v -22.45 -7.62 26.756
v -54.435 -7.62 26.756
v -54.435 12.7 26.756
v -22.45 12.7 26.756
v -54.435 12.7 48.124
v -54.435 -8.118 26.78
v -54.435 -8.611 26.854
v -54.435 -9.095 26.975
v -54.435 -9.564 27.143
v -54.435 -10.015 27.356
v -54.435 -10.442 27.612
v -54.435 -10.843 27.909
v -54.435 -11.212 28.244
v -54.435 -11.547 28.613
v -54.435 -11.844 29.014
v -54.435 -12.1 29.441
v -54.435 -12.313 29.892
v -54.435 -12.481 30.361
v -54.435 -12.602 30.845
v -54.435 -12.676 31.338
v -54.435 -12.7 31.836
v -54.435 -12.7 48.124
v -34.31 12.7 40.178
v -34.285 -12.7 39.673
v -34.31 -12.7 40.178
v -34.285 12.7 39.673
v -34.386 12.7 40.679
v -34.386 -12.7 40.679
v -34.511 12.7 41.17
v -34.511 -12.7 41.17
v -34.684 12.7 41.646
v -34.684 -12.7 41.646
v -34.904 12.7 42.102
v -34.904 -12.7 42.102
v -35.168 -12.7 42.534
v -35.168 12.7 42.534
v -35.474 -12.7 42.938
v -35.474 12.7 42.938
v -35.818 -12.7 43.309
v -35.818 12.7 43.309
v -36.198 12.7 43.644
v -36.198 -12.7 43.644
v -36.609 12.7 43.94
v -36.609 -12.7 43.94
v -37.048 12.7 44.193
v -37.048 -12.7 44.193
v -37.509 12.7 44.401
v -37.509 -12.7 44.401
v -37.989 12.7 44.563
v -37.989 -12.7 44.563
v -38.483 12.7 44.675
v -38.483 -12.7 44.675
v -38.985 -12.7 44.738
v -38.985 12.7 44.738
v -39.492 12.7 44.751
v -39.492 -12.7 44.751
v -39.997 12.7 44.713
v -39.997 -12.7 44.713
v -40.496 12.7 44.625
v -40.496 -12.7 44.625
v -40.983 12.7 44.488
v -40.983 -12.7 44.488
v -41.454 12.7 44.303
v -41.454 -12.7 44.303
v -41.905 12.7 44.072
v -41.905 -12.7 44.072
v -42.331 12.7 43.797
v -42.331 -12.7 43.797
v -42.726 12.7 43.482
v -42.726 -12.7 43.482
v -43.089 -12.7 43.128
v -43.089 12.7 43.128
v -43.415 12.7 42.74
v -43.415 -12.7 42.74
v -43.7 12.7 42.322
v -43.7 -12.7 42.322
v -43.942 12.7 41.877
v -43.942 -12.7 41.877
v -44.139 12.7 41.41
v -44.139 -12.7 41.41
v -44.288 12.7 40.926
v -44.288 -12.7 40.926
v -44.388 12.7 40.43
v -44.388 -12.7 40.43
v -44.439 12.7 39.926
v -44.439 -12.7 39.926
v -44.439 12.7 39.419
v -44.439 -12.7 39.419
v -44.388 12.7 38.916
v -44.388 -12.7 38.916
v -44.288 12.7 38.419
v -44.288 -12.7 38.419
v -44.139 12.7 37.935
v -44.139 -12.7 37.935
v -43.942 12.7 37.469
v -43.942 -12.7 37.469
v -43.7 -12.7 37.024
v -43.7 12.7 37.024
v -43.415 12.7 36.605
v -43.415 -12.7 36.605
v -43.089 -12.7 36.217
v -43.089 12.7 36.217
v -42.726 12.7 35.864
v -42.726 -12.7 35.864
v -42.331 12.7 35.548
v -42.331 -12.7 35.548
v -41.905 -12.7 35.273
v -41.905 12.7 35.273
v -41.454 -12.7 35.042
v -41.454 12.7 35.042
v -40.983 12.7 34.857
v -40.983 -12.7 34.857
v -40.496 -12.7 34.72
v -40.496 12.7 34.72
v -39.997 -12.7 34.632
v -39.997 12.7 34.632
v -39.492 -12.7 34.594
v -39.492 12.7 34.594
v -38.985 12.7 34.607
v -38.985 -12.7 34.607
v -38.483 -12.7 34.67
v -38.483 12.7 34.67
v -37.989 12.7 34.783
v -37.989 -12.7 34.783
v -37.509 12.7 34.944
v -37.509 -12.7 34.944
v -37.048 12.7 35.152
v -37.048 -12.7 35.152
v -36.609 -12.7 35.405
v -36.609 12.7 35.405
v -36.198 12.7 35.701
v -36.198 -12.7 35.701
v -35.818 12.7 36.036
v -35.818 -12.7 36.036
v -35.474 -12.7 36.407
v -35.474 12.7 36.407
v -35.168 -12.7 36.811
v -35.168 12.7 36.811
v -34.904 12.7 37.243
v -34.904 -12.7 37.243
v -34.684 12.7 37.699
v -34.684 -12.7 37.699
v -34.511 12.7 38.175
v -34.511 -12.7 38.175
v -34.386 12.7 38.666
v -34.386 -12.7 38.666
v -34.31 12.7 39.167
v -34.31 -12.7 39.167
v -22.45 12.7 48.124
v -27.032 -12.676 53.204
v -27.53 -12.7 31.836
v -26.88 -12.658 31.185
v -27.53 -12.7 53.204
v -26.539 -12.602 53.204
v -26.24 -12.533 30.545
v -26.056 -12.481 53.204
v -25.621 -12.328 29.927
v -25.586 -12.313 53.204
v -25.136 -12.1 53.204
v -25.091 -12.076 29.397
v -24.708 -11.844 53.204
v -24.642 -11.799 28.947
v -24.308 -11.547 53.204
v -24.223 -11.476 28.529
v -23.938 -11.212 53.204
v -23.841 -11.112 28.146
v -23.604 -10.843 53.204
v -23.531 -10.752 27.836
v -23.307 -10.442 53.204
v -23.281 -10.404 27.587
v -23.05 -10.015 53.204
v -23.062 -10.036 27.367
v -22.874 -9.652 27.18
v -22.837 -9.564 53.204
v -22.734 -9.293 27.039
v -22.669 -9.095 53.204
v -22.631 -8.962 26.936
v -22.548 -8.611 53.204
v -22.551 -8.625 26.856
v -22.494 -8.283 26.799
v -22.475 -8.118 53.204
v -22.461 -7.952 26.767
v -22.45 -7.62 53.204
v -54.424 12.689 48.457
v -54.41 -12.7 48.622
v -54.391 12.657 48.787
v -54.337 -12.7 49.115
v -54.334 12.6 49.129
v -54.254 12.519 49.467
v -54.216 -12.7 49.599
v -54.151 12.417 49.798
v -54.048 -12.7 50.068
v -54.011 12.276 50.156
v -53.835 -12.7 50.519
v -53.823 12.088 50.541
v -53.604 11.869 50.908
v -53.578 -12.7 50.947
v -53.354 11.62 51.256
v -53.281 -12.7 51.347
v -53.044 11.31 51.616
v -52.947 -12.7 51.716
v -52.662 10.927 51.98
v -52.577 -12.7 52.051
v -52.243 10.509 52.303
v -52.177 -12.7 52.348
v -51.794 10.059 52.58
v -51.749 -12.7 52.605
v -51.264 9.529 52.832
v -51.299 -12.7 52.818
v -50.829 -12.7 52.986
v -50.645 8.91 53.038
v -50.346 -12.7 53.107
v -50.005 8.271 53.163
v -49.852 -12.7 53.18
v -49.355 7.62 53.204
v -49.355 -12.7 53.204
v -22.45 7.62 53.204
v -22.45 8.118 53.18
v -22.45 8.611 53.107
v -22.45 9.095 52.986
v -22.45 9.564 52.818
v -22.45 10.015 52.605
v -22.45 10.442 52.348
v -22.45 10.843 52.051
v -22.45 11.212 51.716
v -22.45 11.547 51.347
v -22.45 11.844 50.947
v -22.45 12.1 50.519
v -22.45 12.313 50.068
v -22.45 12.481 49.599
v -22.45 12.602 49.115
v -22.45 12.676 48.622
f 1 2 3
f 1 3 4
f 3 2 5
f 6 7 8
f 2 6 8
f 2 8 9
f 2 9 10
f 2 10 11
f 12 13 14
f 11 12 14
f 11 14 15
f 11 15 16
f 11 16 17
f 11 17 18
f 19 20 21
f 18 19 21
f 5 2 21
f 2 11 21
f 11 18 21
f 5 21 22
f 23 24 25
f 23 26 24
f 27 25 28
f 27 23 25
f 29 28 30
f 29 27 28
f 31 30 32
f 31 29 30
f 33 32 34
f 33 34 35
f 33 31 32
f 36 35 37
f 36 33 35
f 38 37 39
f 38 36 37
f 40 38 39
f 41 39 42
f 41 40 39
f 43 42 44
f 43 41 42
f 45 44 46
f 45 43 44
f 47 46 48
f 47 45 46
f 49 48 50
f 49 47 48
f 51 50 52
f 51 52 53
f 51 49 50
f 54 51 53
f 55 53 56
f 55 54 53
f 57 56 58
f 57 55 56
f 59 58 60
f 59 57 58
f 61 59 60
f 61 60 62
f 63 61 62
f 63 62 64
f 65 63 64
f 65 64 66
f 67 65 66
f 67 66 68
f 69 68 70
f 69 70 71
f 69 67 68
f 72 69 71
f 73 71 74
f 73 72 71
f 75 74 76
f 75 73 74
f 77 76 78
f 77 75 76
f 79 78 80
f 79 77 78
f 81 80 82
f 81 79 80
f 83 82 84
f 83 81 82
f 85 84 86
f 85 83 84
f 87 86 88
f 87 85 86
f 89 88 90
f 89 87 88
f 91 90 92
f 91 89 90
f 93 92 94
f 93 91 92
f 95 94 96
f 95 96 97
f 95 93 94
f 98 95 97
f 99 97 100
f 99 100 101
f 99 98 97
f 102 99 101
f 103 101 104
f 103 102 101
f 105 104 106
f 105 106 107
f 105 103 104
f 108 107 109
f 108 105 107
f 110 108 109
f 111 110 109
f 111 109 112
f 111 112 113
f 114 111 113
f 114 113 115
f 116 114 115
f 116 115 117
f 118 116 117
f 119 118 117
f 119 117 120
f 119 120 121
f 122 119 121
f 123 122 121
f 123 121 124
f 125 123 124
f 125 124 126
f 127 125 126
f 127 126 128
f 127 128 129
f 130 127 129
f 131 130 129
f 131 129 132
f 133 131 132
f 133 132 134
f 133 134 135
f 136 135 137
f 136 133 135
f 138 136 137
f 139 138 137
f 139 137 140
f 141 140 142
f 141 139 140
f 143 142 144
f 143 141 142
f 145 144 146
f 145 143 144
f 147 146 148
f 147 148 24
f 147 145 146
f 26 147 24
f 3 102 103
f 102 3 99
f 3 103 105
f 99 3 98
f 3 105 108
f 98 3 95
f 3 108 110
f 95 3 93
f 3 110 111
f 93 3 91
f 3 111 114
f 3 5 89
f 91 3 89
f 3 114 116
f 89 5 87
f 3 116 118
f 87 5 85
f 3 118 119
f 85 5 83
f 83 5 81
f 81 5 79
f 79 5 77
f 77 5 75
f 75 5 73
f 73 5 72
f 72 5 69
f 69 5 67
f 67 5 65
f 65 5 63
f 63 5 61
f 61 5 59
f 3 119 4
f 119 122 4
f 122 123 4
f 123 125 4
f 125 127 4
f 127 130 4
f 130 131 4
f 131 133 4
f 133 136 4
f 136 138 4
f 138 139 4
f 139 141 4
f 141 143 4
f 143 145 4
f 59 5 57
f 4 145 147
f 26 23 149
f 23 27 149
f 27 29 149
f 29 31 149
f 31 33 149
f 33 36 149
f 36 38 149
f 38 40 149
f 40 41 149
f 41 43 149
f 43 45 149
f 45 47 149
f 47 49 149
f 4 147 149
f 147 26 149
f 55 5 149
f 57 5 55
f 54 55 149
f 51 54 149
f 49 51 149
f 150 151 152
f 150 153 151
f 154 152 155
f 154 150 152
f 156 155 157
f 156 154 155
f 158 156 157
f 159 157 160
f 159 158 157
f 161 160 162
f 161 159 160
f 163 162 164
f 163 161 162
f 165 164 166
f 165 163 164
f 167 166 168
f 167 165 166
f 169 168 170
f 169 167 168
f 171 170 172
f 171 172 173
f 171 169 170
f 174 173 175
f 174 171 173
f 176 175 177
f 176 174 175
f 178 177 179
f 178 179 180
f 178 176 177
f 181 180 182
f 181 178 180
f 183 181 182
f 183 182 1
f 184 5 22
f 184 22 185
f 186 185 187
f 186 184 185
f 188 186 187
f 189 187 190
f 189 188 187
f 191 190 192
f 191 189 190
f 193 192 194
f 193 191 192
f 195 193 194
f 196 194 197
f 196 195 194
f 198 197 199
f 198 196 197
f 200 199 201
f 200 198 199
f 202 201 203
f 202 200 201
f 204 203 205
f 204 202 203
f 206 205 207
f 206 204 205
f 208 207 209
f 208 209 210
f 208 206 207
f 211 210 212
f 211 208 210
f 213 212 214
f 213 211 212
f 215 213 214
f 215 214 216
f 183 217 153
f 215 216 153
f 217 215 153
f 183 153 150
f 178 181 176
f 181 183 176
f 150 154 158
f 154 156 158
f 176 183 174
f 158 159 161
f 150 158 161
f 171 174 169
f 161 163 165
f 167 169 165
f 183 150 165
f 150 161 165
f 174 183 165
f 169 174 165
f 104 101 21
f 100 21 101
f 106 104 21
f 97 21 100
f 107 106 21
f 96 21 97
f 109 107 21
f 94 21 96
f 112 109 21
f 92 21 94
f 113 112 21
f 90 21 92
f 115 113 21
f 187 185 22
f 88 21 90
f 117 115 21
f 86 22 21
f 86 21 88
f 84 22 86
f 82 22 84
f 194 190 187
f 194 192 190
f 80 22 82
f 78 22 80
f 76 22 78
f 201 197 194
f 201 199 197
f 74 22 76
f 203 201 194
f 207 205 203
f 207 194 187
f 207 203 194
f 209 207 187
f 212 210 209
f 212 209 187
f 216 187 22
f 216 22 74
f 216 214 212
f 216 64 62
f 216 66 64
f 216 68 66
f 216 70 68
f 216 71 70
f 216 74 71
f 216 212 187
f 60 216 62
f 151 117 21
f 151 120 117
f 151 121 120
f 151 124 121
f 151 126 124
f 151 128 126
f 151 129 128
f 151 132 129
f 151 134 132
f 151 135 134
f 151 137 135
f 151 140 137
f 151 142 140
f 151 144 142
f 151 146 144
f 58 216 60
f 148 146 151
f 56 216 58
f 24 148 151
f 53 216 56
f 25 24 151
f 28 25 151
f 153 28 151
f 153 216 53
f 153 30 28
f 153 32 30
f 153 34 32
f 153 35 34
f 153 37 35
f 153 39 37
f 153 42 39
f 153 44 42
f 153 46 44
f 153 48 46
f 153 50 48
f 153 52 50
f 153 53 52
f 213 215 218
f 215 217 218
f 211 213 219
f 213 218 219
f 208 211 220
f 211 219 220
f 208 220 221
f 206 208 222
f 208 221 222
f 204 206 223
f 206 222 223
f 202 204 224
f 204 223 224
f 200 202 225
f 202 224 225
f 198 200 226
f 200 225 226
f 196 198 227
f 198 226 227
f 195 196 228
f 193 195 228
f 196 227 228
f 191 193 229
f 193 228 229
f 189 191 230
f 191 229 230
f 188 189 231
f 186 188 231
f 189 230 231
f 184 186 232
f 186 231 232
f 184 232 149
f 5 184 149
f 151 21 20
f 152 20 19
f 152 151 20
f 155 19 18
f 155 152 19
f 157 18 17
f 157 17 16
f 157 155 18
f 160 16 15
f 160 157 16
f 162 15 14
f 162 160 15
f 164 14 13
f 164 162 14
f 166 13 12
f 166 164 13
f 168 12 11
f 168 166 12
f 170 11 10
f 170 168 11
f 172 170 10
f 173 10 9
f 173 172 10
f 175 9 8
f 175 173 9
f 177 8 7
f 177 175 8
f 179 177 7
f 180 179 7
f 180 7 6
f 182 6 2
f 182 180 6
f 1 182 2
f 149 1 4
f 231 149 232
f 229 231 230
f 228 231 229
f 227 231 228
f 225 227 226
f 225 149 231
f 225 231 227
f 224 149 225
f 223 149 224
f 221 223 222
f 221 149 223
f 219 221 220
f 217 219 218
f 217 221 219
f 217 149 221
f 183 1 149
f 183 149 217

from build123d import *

# Parameters (mm, degrees)
F0_W     = 31.984137
F0_H     = 26.448421
F0_R     = 5.08
F1_DEPTH = 12.7
F2_R     = 5.08


with BuildPart() as f1:
    # F0 (on Front) → F1 (new body, symmetric)
    with BuildSketch(Plane.XZ):
        with Locations((-38.442476, 39.980176)):
            Rectangle(F0_W, F0_H)
        with Locations((-39.365098, 39.672639)):
            Circle(F0_R, mode=Mode.SUBTRACT)
    extrude(amount=F1_DEPTH, both=True)

    # F2
    f2_edges = [f1.edges().sort_by_distance(p)[0] for p in [
        (-38.442477, 12.7, 53.204387),
        (-54.434545, 0, 53.204387),
        (-22.450408, -12.7, 39.980177),
        (-38.442477, -12.7, 26.755966),
    ]]
    fillet(f2_edges, radius=F2_R)


solid = f1.part
